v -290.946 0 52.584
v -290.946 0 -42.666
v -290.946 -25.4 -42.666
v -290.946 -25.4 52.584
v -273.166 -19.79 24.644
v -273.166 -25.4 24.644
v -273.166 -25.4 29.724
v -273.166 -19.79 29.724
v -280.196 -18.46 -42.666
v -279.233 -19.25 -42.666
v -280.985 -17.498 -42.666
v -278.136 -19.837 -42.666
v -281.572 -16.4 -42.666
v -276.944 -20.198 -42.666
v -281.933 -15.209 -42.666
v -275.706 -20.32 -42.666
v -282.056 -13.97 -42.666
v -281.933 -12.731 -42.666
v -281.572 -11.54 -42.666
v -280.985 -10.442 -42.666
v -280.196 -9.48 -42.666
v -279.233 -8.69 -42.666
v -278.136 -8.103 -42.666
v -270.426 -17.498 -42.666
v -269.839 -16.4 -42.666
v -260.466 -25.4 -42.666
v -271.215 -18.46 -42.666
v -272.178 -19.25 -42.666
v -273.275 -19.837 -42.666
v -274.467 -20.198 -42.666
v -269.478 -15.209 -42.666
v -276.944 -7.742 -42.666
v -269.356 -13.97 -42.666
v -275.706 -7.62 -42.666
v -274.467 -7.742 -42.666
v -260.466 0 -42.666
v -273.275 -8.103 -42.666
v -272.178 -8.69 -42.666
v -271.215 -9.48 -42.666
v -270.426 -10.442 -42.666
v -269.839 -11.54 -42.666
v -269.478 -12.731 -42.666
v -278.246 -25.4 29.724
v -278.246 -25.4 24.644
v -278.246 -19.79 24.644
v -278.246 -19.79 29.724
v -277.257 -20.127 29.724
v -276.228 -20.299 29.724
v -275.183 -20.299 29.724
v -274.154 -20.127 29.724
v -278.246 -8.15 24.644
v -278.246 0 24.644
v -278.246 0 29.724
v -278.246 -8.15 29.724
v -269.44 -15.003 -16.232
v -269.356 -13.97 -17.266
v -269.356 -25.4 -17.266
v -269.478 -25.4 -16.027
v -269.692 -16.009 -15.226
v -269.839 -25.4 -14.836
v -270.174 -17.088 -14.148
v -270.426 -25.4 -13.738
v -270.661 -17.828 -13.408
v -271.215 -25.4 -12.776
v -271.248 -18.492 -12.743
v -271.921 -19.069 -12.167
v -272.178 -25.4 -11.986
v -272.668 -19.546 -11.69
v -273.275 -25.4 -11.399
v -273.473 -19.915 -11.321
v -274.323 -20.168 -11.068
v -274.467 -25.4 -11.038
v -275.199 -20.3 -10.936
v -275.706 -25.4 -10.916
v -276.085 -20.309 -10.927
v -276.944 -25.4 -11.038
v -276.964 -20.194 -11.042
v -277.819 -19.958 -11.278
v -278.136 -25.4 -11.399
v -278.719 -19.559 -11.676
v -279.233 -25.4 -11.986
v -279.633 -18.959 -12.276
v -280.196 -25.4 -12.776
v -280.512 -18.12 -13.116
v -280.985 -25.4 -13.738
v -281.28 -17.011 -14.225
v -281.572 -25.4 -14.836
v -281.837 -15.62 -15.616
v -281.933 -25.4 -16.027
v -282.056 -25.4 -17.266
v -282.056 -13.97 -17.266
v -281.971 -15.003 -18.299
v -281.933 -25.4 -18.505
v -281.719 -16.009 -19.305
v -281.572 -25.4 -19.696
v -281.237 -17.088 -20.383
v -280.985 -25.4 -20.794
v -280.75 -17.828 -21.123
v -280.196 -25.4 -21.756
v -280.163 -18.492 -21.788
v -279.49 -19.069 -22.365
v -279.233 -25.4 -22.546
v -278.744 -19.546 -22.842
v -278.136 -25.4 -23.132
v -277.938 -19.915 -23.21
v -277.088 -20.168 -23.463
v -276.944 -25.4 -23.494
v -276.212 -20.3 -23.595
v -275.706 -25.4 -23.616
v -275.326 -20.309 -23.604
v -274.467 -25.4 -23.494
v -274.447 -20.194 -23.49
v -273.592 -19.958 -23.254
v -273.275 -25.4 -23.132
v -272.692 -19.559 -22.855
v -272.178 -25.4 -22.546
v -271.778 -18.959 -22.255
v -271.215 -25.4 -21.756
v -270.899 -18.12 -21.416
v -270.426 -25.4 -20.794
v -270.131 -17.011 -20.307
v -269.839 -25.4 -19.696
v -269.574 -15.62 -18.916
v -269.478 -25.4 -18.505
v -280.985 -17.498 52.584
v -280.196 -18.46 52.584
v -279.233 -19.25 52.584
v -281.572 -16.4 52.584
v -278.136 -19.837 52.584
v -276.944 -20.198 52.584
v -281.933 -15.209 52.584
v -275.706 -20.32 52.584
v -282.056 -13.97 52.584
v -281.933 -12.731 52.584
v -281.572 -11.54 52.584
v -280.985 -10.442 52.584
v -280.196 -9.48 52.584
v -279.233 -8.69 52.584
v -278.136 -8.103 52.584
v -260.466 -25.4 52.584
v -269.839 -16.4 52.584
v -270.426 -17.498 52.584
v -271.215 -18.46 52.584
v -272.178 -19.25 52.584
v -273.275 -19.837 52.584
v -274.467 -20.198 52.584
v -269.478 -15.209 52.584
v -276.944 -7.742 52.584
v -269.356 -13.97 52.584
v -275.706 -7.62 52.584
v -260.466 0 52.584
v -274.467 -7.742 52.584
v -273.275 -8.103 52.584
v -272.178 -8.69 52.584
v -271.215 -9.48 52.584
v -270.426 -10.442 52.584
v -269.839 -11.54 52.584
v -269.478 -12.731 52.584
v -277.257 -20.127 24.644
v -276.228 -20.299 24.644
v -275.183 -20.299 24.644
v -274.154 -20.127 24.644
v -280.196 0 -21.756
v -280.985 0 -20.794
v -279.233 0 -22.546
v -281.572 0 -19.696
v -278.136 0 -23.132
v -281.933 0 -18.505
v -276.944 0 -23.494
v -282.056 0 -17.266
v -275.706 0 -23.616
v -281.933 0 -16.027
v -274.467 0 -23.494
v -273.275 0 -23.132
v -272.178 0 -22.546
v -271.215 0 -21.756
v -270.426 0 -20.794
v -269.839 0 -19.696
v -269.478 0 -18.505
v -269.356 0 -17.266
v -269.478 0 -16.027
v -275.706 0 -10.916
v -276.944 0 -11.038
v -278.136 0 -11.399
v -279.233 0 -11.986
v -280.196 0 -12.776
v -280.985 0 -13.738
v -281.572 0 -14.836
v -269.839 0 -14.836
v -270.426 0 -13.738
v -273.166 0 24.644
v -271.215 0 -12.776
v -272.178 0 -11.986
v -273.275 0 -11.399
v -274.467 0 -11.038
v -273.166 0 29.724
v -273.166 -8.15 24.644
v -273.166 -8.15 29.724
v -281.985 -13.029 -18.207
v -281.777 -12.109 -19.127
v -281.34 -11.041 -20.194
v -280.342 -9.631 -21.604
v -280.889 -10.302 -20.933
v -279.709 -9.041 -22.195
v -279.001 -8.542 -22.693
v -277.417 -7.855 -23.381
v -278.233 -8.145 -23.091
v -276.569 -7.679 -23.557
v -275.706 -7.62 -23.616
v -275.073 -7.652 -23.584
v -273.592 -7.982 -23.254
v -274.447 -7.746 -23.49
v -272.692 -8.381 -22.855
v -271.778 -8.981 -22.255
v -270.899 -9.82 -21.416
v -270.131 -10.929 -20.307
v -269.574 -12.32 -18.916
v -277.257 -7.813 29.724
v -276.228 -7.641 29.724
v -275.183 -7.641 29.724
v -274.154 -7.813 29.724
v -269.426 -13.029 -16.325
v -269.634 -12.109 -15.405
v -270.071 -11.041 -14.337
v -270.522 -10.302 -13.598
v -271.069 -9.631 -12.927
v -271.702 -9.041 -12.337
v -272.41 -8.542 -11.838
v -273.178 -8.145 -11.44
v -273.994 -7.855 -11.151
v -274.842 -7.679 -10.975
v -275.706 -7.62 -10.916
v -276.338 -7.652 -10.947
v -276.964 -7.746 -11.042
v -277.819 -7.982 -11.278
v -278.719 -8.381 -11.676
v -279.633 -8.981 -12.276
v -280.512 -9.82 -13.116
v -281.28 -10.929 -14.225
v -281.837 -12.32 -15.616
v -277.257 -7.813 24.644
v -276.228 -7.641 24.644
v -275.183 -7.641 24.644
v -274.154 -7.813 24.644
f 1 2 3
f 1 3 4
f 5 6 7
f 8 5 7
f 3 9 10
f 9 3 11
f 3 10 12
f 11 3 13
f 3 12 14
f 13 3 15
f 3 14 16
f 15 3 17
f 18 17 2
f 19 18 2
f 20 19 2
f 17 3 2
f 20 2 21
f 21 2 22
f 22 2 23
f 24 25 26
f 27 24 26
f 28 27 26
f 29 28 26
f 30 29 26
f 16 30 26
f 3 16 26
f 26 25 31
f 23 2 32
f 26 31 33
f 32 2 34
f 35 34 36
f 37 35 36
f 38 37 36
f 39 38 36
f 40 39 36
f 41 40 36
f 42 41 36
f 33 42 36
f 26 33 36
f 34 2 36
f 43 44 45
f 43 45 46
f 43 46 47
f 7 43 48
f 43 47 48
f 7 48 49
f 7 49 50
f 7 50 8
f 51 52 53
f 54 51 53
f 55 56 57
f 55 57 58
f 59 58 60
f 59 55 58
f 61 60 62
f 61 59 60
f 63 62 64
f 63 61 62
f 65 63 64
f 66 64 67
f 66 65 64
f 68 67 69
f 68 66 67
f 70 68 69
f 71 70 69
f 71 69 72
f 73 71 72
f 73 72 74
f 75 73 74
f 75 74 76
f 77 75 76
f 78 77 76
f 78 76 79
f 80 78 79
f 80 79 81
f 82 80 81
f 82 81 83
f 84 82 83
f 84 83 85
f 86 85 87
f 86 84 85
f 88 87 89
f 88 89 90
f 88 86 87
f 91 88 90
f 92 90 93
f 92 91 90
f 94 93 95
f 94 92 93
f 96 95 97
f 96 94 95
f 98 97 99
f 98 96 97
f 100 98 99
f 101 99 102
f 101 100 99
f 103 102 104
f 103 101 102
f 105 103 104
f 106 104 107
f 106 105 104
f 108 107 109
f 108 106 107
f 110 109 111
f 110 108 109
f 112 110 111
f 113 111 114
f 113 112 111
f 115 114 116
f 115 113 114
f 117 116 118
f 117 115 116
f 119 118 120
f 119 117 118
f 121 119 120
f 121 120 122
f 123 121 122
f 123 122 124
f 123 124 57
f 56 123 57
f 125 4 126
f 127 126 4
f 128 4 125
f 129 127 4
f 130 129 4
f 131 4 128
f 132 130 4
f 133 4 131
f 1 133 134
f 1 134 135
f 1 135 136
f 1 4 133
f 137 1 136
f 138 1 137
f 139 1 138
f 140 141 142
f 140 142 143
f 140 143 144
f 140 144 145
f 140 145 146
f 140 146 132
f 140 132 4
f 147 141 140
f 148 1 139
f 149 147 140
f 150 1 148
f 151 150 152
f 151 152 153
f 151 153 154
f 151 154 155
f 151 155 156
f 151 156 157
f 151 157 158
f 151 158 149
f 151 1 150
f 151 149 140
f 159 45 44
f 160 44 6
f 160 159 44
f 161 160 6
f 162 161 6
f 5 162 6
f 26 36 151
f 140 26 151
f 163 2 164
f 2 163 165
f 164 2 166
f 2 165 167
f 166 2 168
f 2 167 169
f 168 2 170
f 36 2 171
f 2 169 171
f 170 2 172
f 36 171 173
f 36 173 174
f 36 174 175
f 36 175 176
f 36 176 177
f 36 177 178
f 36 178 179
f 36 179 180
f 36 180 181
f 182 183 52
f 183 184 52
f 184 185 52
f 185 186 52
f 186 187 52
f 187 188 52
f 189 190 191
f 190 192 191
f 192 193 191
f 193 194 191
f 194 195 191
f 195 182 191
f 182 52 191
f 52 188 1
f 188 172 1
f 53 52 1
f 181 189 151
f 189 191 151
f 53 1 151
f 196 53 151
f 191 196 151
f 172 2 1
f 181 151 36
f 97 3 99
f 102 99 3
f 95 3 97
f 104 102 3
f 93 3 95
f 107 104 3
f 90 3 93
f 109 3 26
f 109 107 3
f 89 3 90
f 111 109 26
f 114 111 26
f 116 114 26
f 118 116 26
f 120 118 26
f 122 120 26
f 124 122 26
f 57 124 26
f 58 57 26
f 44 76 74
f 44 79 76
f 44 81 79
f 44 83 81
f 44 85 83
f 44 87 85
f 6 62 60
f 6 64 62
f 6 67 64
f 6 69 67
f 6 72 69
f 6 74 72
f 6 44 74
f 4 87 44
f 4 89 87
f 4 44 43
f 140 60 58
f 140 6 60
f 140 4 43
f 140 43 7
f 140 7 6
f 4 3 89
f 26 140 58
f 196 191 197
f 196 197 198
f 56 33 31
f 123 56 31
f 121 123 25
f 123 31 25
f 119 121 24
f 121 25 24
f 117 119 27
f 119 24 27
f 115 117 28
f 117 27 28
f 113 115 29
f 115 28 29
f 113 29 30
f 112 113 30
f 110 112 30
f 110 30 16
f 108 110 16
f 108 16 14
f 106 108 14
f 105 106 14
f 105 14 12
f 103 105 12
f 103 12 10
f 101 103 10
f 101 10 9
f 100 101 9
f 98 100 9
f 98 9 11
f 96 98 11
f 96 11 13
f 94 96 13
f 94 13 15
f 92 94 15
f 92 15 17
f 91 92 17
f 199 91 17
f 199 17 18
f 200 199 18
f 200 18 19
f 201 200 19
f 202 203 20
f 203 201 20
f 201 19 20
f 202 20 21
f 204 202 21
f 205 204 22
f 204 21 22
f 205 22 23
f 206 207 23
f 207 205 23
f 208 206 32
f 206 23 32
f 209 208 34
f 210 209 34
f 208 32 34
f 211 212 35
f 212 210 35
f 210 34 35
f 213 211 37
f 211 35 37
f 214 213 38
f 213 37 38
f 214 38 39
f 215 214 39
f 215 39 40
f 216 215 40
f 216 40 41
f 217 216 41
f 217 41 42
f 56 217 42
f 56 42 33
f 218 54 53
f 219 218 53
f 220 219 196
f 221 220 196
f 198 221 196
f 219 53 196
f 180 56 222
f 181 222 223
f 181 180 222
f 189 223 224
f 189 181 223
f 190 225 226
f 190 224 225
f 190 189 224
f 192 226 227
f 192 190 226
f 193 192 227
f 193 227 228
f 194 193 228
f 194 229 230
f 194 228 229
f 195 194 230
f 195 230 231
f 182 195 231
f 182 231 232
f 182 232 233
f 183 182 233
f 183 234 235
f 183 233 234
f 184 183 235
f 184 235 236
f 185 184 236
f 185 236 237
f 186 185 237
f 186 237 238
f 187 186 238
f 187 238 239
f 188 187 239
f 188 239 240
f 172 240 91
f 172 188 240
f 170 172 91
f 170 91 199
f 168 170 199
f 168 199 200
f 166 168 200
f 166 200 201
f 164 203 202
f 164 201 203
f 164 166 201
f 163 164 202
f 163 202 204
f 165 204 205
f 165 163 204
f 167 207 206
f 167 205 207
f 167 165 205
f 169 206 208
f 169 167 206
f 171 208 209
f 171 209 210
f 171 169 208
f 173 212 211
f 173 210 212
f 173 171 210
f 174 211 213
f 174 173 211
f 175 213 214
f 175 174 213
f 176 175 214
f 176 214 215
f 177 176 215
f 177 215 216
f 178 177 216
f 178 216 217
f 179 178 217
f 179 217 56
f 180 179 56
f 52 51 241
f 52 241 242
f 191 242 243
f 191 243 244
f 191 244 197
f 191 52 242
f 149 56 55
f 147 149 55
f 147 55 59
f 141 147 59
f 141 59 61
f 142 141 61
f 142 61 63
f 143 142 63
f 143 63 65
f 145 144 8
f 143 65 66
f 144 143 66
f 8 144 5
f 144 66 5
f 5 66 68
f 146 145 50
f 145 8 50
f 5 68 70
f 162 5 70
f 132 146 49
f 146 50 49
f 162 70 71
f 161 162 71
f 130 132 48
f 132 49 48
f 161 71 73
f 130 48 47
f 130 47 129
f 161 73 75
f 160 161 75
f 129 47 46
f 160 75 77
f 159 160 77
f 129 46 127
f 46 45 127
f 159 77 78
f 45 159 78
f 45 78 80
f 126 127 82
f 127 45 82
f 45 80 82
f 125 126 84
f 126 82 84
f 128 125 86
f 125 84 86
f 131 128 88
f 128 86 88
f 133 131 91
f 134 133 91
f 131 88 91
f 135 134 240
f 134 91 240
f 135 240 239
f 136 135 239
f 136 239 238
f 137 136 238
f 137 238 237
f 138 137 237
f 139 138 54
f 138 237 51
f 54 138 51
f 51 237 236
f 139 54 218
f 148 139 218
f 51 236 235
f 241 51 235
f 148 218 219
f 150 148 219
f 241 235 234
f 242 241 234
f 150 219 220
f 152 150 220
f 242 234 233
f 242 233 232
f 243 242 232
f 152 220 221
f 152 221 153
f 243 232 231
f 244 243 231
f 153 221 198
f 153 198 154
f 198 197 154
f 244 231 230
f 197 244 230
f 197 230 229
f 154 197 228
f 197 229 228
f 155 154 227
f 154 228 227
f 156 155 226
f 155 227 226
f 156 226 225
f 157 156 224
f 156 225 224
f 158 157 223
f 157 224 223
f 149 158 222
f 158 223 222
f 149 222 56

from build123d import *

# Parameters (mm, degrees)
F0_W     = 30.48
F0_H     = 95.25
F0_R     = 6.35
F0_W_2   = 5.08
F0_H_2   = 5.08
F1_DEPTH = 25.4
F2_R     = 6.35
F3_DEPTH = 95.251


with BuildPart() as f1:
    # F0 (on Front) → F1 (new body)
    with BuildSketch(Plane.XZ):
        with Locations((-275.705503, 4.959305)):
            Rectangle(F0_W, F0_H)
        with Locations((-275.705503, -17.265695)):
            Circle(F0_R, mode=Mode.SUBTRACT)
        with Locations((-275.705503, 27.184305)):
            Rectangle(F0_W_2, F0_H_2, mode=Mode.SUBTRACT)
    extrude(amount=F1_DEPTH)

    # F2 (on face) → F3 (cut, through all)
    with BuildSketch(Plane(origin=(0, 0, -42.665695), x_dir=(1, 0, 0), z_dir=(0, 0, -1))):
        with Locations((-275.705503, 13.97)):
            Circle(F2_R)
    extrude(amount=-F3_DEPTH, mode=Mode.SUBTRACT)


solid = f1.part
